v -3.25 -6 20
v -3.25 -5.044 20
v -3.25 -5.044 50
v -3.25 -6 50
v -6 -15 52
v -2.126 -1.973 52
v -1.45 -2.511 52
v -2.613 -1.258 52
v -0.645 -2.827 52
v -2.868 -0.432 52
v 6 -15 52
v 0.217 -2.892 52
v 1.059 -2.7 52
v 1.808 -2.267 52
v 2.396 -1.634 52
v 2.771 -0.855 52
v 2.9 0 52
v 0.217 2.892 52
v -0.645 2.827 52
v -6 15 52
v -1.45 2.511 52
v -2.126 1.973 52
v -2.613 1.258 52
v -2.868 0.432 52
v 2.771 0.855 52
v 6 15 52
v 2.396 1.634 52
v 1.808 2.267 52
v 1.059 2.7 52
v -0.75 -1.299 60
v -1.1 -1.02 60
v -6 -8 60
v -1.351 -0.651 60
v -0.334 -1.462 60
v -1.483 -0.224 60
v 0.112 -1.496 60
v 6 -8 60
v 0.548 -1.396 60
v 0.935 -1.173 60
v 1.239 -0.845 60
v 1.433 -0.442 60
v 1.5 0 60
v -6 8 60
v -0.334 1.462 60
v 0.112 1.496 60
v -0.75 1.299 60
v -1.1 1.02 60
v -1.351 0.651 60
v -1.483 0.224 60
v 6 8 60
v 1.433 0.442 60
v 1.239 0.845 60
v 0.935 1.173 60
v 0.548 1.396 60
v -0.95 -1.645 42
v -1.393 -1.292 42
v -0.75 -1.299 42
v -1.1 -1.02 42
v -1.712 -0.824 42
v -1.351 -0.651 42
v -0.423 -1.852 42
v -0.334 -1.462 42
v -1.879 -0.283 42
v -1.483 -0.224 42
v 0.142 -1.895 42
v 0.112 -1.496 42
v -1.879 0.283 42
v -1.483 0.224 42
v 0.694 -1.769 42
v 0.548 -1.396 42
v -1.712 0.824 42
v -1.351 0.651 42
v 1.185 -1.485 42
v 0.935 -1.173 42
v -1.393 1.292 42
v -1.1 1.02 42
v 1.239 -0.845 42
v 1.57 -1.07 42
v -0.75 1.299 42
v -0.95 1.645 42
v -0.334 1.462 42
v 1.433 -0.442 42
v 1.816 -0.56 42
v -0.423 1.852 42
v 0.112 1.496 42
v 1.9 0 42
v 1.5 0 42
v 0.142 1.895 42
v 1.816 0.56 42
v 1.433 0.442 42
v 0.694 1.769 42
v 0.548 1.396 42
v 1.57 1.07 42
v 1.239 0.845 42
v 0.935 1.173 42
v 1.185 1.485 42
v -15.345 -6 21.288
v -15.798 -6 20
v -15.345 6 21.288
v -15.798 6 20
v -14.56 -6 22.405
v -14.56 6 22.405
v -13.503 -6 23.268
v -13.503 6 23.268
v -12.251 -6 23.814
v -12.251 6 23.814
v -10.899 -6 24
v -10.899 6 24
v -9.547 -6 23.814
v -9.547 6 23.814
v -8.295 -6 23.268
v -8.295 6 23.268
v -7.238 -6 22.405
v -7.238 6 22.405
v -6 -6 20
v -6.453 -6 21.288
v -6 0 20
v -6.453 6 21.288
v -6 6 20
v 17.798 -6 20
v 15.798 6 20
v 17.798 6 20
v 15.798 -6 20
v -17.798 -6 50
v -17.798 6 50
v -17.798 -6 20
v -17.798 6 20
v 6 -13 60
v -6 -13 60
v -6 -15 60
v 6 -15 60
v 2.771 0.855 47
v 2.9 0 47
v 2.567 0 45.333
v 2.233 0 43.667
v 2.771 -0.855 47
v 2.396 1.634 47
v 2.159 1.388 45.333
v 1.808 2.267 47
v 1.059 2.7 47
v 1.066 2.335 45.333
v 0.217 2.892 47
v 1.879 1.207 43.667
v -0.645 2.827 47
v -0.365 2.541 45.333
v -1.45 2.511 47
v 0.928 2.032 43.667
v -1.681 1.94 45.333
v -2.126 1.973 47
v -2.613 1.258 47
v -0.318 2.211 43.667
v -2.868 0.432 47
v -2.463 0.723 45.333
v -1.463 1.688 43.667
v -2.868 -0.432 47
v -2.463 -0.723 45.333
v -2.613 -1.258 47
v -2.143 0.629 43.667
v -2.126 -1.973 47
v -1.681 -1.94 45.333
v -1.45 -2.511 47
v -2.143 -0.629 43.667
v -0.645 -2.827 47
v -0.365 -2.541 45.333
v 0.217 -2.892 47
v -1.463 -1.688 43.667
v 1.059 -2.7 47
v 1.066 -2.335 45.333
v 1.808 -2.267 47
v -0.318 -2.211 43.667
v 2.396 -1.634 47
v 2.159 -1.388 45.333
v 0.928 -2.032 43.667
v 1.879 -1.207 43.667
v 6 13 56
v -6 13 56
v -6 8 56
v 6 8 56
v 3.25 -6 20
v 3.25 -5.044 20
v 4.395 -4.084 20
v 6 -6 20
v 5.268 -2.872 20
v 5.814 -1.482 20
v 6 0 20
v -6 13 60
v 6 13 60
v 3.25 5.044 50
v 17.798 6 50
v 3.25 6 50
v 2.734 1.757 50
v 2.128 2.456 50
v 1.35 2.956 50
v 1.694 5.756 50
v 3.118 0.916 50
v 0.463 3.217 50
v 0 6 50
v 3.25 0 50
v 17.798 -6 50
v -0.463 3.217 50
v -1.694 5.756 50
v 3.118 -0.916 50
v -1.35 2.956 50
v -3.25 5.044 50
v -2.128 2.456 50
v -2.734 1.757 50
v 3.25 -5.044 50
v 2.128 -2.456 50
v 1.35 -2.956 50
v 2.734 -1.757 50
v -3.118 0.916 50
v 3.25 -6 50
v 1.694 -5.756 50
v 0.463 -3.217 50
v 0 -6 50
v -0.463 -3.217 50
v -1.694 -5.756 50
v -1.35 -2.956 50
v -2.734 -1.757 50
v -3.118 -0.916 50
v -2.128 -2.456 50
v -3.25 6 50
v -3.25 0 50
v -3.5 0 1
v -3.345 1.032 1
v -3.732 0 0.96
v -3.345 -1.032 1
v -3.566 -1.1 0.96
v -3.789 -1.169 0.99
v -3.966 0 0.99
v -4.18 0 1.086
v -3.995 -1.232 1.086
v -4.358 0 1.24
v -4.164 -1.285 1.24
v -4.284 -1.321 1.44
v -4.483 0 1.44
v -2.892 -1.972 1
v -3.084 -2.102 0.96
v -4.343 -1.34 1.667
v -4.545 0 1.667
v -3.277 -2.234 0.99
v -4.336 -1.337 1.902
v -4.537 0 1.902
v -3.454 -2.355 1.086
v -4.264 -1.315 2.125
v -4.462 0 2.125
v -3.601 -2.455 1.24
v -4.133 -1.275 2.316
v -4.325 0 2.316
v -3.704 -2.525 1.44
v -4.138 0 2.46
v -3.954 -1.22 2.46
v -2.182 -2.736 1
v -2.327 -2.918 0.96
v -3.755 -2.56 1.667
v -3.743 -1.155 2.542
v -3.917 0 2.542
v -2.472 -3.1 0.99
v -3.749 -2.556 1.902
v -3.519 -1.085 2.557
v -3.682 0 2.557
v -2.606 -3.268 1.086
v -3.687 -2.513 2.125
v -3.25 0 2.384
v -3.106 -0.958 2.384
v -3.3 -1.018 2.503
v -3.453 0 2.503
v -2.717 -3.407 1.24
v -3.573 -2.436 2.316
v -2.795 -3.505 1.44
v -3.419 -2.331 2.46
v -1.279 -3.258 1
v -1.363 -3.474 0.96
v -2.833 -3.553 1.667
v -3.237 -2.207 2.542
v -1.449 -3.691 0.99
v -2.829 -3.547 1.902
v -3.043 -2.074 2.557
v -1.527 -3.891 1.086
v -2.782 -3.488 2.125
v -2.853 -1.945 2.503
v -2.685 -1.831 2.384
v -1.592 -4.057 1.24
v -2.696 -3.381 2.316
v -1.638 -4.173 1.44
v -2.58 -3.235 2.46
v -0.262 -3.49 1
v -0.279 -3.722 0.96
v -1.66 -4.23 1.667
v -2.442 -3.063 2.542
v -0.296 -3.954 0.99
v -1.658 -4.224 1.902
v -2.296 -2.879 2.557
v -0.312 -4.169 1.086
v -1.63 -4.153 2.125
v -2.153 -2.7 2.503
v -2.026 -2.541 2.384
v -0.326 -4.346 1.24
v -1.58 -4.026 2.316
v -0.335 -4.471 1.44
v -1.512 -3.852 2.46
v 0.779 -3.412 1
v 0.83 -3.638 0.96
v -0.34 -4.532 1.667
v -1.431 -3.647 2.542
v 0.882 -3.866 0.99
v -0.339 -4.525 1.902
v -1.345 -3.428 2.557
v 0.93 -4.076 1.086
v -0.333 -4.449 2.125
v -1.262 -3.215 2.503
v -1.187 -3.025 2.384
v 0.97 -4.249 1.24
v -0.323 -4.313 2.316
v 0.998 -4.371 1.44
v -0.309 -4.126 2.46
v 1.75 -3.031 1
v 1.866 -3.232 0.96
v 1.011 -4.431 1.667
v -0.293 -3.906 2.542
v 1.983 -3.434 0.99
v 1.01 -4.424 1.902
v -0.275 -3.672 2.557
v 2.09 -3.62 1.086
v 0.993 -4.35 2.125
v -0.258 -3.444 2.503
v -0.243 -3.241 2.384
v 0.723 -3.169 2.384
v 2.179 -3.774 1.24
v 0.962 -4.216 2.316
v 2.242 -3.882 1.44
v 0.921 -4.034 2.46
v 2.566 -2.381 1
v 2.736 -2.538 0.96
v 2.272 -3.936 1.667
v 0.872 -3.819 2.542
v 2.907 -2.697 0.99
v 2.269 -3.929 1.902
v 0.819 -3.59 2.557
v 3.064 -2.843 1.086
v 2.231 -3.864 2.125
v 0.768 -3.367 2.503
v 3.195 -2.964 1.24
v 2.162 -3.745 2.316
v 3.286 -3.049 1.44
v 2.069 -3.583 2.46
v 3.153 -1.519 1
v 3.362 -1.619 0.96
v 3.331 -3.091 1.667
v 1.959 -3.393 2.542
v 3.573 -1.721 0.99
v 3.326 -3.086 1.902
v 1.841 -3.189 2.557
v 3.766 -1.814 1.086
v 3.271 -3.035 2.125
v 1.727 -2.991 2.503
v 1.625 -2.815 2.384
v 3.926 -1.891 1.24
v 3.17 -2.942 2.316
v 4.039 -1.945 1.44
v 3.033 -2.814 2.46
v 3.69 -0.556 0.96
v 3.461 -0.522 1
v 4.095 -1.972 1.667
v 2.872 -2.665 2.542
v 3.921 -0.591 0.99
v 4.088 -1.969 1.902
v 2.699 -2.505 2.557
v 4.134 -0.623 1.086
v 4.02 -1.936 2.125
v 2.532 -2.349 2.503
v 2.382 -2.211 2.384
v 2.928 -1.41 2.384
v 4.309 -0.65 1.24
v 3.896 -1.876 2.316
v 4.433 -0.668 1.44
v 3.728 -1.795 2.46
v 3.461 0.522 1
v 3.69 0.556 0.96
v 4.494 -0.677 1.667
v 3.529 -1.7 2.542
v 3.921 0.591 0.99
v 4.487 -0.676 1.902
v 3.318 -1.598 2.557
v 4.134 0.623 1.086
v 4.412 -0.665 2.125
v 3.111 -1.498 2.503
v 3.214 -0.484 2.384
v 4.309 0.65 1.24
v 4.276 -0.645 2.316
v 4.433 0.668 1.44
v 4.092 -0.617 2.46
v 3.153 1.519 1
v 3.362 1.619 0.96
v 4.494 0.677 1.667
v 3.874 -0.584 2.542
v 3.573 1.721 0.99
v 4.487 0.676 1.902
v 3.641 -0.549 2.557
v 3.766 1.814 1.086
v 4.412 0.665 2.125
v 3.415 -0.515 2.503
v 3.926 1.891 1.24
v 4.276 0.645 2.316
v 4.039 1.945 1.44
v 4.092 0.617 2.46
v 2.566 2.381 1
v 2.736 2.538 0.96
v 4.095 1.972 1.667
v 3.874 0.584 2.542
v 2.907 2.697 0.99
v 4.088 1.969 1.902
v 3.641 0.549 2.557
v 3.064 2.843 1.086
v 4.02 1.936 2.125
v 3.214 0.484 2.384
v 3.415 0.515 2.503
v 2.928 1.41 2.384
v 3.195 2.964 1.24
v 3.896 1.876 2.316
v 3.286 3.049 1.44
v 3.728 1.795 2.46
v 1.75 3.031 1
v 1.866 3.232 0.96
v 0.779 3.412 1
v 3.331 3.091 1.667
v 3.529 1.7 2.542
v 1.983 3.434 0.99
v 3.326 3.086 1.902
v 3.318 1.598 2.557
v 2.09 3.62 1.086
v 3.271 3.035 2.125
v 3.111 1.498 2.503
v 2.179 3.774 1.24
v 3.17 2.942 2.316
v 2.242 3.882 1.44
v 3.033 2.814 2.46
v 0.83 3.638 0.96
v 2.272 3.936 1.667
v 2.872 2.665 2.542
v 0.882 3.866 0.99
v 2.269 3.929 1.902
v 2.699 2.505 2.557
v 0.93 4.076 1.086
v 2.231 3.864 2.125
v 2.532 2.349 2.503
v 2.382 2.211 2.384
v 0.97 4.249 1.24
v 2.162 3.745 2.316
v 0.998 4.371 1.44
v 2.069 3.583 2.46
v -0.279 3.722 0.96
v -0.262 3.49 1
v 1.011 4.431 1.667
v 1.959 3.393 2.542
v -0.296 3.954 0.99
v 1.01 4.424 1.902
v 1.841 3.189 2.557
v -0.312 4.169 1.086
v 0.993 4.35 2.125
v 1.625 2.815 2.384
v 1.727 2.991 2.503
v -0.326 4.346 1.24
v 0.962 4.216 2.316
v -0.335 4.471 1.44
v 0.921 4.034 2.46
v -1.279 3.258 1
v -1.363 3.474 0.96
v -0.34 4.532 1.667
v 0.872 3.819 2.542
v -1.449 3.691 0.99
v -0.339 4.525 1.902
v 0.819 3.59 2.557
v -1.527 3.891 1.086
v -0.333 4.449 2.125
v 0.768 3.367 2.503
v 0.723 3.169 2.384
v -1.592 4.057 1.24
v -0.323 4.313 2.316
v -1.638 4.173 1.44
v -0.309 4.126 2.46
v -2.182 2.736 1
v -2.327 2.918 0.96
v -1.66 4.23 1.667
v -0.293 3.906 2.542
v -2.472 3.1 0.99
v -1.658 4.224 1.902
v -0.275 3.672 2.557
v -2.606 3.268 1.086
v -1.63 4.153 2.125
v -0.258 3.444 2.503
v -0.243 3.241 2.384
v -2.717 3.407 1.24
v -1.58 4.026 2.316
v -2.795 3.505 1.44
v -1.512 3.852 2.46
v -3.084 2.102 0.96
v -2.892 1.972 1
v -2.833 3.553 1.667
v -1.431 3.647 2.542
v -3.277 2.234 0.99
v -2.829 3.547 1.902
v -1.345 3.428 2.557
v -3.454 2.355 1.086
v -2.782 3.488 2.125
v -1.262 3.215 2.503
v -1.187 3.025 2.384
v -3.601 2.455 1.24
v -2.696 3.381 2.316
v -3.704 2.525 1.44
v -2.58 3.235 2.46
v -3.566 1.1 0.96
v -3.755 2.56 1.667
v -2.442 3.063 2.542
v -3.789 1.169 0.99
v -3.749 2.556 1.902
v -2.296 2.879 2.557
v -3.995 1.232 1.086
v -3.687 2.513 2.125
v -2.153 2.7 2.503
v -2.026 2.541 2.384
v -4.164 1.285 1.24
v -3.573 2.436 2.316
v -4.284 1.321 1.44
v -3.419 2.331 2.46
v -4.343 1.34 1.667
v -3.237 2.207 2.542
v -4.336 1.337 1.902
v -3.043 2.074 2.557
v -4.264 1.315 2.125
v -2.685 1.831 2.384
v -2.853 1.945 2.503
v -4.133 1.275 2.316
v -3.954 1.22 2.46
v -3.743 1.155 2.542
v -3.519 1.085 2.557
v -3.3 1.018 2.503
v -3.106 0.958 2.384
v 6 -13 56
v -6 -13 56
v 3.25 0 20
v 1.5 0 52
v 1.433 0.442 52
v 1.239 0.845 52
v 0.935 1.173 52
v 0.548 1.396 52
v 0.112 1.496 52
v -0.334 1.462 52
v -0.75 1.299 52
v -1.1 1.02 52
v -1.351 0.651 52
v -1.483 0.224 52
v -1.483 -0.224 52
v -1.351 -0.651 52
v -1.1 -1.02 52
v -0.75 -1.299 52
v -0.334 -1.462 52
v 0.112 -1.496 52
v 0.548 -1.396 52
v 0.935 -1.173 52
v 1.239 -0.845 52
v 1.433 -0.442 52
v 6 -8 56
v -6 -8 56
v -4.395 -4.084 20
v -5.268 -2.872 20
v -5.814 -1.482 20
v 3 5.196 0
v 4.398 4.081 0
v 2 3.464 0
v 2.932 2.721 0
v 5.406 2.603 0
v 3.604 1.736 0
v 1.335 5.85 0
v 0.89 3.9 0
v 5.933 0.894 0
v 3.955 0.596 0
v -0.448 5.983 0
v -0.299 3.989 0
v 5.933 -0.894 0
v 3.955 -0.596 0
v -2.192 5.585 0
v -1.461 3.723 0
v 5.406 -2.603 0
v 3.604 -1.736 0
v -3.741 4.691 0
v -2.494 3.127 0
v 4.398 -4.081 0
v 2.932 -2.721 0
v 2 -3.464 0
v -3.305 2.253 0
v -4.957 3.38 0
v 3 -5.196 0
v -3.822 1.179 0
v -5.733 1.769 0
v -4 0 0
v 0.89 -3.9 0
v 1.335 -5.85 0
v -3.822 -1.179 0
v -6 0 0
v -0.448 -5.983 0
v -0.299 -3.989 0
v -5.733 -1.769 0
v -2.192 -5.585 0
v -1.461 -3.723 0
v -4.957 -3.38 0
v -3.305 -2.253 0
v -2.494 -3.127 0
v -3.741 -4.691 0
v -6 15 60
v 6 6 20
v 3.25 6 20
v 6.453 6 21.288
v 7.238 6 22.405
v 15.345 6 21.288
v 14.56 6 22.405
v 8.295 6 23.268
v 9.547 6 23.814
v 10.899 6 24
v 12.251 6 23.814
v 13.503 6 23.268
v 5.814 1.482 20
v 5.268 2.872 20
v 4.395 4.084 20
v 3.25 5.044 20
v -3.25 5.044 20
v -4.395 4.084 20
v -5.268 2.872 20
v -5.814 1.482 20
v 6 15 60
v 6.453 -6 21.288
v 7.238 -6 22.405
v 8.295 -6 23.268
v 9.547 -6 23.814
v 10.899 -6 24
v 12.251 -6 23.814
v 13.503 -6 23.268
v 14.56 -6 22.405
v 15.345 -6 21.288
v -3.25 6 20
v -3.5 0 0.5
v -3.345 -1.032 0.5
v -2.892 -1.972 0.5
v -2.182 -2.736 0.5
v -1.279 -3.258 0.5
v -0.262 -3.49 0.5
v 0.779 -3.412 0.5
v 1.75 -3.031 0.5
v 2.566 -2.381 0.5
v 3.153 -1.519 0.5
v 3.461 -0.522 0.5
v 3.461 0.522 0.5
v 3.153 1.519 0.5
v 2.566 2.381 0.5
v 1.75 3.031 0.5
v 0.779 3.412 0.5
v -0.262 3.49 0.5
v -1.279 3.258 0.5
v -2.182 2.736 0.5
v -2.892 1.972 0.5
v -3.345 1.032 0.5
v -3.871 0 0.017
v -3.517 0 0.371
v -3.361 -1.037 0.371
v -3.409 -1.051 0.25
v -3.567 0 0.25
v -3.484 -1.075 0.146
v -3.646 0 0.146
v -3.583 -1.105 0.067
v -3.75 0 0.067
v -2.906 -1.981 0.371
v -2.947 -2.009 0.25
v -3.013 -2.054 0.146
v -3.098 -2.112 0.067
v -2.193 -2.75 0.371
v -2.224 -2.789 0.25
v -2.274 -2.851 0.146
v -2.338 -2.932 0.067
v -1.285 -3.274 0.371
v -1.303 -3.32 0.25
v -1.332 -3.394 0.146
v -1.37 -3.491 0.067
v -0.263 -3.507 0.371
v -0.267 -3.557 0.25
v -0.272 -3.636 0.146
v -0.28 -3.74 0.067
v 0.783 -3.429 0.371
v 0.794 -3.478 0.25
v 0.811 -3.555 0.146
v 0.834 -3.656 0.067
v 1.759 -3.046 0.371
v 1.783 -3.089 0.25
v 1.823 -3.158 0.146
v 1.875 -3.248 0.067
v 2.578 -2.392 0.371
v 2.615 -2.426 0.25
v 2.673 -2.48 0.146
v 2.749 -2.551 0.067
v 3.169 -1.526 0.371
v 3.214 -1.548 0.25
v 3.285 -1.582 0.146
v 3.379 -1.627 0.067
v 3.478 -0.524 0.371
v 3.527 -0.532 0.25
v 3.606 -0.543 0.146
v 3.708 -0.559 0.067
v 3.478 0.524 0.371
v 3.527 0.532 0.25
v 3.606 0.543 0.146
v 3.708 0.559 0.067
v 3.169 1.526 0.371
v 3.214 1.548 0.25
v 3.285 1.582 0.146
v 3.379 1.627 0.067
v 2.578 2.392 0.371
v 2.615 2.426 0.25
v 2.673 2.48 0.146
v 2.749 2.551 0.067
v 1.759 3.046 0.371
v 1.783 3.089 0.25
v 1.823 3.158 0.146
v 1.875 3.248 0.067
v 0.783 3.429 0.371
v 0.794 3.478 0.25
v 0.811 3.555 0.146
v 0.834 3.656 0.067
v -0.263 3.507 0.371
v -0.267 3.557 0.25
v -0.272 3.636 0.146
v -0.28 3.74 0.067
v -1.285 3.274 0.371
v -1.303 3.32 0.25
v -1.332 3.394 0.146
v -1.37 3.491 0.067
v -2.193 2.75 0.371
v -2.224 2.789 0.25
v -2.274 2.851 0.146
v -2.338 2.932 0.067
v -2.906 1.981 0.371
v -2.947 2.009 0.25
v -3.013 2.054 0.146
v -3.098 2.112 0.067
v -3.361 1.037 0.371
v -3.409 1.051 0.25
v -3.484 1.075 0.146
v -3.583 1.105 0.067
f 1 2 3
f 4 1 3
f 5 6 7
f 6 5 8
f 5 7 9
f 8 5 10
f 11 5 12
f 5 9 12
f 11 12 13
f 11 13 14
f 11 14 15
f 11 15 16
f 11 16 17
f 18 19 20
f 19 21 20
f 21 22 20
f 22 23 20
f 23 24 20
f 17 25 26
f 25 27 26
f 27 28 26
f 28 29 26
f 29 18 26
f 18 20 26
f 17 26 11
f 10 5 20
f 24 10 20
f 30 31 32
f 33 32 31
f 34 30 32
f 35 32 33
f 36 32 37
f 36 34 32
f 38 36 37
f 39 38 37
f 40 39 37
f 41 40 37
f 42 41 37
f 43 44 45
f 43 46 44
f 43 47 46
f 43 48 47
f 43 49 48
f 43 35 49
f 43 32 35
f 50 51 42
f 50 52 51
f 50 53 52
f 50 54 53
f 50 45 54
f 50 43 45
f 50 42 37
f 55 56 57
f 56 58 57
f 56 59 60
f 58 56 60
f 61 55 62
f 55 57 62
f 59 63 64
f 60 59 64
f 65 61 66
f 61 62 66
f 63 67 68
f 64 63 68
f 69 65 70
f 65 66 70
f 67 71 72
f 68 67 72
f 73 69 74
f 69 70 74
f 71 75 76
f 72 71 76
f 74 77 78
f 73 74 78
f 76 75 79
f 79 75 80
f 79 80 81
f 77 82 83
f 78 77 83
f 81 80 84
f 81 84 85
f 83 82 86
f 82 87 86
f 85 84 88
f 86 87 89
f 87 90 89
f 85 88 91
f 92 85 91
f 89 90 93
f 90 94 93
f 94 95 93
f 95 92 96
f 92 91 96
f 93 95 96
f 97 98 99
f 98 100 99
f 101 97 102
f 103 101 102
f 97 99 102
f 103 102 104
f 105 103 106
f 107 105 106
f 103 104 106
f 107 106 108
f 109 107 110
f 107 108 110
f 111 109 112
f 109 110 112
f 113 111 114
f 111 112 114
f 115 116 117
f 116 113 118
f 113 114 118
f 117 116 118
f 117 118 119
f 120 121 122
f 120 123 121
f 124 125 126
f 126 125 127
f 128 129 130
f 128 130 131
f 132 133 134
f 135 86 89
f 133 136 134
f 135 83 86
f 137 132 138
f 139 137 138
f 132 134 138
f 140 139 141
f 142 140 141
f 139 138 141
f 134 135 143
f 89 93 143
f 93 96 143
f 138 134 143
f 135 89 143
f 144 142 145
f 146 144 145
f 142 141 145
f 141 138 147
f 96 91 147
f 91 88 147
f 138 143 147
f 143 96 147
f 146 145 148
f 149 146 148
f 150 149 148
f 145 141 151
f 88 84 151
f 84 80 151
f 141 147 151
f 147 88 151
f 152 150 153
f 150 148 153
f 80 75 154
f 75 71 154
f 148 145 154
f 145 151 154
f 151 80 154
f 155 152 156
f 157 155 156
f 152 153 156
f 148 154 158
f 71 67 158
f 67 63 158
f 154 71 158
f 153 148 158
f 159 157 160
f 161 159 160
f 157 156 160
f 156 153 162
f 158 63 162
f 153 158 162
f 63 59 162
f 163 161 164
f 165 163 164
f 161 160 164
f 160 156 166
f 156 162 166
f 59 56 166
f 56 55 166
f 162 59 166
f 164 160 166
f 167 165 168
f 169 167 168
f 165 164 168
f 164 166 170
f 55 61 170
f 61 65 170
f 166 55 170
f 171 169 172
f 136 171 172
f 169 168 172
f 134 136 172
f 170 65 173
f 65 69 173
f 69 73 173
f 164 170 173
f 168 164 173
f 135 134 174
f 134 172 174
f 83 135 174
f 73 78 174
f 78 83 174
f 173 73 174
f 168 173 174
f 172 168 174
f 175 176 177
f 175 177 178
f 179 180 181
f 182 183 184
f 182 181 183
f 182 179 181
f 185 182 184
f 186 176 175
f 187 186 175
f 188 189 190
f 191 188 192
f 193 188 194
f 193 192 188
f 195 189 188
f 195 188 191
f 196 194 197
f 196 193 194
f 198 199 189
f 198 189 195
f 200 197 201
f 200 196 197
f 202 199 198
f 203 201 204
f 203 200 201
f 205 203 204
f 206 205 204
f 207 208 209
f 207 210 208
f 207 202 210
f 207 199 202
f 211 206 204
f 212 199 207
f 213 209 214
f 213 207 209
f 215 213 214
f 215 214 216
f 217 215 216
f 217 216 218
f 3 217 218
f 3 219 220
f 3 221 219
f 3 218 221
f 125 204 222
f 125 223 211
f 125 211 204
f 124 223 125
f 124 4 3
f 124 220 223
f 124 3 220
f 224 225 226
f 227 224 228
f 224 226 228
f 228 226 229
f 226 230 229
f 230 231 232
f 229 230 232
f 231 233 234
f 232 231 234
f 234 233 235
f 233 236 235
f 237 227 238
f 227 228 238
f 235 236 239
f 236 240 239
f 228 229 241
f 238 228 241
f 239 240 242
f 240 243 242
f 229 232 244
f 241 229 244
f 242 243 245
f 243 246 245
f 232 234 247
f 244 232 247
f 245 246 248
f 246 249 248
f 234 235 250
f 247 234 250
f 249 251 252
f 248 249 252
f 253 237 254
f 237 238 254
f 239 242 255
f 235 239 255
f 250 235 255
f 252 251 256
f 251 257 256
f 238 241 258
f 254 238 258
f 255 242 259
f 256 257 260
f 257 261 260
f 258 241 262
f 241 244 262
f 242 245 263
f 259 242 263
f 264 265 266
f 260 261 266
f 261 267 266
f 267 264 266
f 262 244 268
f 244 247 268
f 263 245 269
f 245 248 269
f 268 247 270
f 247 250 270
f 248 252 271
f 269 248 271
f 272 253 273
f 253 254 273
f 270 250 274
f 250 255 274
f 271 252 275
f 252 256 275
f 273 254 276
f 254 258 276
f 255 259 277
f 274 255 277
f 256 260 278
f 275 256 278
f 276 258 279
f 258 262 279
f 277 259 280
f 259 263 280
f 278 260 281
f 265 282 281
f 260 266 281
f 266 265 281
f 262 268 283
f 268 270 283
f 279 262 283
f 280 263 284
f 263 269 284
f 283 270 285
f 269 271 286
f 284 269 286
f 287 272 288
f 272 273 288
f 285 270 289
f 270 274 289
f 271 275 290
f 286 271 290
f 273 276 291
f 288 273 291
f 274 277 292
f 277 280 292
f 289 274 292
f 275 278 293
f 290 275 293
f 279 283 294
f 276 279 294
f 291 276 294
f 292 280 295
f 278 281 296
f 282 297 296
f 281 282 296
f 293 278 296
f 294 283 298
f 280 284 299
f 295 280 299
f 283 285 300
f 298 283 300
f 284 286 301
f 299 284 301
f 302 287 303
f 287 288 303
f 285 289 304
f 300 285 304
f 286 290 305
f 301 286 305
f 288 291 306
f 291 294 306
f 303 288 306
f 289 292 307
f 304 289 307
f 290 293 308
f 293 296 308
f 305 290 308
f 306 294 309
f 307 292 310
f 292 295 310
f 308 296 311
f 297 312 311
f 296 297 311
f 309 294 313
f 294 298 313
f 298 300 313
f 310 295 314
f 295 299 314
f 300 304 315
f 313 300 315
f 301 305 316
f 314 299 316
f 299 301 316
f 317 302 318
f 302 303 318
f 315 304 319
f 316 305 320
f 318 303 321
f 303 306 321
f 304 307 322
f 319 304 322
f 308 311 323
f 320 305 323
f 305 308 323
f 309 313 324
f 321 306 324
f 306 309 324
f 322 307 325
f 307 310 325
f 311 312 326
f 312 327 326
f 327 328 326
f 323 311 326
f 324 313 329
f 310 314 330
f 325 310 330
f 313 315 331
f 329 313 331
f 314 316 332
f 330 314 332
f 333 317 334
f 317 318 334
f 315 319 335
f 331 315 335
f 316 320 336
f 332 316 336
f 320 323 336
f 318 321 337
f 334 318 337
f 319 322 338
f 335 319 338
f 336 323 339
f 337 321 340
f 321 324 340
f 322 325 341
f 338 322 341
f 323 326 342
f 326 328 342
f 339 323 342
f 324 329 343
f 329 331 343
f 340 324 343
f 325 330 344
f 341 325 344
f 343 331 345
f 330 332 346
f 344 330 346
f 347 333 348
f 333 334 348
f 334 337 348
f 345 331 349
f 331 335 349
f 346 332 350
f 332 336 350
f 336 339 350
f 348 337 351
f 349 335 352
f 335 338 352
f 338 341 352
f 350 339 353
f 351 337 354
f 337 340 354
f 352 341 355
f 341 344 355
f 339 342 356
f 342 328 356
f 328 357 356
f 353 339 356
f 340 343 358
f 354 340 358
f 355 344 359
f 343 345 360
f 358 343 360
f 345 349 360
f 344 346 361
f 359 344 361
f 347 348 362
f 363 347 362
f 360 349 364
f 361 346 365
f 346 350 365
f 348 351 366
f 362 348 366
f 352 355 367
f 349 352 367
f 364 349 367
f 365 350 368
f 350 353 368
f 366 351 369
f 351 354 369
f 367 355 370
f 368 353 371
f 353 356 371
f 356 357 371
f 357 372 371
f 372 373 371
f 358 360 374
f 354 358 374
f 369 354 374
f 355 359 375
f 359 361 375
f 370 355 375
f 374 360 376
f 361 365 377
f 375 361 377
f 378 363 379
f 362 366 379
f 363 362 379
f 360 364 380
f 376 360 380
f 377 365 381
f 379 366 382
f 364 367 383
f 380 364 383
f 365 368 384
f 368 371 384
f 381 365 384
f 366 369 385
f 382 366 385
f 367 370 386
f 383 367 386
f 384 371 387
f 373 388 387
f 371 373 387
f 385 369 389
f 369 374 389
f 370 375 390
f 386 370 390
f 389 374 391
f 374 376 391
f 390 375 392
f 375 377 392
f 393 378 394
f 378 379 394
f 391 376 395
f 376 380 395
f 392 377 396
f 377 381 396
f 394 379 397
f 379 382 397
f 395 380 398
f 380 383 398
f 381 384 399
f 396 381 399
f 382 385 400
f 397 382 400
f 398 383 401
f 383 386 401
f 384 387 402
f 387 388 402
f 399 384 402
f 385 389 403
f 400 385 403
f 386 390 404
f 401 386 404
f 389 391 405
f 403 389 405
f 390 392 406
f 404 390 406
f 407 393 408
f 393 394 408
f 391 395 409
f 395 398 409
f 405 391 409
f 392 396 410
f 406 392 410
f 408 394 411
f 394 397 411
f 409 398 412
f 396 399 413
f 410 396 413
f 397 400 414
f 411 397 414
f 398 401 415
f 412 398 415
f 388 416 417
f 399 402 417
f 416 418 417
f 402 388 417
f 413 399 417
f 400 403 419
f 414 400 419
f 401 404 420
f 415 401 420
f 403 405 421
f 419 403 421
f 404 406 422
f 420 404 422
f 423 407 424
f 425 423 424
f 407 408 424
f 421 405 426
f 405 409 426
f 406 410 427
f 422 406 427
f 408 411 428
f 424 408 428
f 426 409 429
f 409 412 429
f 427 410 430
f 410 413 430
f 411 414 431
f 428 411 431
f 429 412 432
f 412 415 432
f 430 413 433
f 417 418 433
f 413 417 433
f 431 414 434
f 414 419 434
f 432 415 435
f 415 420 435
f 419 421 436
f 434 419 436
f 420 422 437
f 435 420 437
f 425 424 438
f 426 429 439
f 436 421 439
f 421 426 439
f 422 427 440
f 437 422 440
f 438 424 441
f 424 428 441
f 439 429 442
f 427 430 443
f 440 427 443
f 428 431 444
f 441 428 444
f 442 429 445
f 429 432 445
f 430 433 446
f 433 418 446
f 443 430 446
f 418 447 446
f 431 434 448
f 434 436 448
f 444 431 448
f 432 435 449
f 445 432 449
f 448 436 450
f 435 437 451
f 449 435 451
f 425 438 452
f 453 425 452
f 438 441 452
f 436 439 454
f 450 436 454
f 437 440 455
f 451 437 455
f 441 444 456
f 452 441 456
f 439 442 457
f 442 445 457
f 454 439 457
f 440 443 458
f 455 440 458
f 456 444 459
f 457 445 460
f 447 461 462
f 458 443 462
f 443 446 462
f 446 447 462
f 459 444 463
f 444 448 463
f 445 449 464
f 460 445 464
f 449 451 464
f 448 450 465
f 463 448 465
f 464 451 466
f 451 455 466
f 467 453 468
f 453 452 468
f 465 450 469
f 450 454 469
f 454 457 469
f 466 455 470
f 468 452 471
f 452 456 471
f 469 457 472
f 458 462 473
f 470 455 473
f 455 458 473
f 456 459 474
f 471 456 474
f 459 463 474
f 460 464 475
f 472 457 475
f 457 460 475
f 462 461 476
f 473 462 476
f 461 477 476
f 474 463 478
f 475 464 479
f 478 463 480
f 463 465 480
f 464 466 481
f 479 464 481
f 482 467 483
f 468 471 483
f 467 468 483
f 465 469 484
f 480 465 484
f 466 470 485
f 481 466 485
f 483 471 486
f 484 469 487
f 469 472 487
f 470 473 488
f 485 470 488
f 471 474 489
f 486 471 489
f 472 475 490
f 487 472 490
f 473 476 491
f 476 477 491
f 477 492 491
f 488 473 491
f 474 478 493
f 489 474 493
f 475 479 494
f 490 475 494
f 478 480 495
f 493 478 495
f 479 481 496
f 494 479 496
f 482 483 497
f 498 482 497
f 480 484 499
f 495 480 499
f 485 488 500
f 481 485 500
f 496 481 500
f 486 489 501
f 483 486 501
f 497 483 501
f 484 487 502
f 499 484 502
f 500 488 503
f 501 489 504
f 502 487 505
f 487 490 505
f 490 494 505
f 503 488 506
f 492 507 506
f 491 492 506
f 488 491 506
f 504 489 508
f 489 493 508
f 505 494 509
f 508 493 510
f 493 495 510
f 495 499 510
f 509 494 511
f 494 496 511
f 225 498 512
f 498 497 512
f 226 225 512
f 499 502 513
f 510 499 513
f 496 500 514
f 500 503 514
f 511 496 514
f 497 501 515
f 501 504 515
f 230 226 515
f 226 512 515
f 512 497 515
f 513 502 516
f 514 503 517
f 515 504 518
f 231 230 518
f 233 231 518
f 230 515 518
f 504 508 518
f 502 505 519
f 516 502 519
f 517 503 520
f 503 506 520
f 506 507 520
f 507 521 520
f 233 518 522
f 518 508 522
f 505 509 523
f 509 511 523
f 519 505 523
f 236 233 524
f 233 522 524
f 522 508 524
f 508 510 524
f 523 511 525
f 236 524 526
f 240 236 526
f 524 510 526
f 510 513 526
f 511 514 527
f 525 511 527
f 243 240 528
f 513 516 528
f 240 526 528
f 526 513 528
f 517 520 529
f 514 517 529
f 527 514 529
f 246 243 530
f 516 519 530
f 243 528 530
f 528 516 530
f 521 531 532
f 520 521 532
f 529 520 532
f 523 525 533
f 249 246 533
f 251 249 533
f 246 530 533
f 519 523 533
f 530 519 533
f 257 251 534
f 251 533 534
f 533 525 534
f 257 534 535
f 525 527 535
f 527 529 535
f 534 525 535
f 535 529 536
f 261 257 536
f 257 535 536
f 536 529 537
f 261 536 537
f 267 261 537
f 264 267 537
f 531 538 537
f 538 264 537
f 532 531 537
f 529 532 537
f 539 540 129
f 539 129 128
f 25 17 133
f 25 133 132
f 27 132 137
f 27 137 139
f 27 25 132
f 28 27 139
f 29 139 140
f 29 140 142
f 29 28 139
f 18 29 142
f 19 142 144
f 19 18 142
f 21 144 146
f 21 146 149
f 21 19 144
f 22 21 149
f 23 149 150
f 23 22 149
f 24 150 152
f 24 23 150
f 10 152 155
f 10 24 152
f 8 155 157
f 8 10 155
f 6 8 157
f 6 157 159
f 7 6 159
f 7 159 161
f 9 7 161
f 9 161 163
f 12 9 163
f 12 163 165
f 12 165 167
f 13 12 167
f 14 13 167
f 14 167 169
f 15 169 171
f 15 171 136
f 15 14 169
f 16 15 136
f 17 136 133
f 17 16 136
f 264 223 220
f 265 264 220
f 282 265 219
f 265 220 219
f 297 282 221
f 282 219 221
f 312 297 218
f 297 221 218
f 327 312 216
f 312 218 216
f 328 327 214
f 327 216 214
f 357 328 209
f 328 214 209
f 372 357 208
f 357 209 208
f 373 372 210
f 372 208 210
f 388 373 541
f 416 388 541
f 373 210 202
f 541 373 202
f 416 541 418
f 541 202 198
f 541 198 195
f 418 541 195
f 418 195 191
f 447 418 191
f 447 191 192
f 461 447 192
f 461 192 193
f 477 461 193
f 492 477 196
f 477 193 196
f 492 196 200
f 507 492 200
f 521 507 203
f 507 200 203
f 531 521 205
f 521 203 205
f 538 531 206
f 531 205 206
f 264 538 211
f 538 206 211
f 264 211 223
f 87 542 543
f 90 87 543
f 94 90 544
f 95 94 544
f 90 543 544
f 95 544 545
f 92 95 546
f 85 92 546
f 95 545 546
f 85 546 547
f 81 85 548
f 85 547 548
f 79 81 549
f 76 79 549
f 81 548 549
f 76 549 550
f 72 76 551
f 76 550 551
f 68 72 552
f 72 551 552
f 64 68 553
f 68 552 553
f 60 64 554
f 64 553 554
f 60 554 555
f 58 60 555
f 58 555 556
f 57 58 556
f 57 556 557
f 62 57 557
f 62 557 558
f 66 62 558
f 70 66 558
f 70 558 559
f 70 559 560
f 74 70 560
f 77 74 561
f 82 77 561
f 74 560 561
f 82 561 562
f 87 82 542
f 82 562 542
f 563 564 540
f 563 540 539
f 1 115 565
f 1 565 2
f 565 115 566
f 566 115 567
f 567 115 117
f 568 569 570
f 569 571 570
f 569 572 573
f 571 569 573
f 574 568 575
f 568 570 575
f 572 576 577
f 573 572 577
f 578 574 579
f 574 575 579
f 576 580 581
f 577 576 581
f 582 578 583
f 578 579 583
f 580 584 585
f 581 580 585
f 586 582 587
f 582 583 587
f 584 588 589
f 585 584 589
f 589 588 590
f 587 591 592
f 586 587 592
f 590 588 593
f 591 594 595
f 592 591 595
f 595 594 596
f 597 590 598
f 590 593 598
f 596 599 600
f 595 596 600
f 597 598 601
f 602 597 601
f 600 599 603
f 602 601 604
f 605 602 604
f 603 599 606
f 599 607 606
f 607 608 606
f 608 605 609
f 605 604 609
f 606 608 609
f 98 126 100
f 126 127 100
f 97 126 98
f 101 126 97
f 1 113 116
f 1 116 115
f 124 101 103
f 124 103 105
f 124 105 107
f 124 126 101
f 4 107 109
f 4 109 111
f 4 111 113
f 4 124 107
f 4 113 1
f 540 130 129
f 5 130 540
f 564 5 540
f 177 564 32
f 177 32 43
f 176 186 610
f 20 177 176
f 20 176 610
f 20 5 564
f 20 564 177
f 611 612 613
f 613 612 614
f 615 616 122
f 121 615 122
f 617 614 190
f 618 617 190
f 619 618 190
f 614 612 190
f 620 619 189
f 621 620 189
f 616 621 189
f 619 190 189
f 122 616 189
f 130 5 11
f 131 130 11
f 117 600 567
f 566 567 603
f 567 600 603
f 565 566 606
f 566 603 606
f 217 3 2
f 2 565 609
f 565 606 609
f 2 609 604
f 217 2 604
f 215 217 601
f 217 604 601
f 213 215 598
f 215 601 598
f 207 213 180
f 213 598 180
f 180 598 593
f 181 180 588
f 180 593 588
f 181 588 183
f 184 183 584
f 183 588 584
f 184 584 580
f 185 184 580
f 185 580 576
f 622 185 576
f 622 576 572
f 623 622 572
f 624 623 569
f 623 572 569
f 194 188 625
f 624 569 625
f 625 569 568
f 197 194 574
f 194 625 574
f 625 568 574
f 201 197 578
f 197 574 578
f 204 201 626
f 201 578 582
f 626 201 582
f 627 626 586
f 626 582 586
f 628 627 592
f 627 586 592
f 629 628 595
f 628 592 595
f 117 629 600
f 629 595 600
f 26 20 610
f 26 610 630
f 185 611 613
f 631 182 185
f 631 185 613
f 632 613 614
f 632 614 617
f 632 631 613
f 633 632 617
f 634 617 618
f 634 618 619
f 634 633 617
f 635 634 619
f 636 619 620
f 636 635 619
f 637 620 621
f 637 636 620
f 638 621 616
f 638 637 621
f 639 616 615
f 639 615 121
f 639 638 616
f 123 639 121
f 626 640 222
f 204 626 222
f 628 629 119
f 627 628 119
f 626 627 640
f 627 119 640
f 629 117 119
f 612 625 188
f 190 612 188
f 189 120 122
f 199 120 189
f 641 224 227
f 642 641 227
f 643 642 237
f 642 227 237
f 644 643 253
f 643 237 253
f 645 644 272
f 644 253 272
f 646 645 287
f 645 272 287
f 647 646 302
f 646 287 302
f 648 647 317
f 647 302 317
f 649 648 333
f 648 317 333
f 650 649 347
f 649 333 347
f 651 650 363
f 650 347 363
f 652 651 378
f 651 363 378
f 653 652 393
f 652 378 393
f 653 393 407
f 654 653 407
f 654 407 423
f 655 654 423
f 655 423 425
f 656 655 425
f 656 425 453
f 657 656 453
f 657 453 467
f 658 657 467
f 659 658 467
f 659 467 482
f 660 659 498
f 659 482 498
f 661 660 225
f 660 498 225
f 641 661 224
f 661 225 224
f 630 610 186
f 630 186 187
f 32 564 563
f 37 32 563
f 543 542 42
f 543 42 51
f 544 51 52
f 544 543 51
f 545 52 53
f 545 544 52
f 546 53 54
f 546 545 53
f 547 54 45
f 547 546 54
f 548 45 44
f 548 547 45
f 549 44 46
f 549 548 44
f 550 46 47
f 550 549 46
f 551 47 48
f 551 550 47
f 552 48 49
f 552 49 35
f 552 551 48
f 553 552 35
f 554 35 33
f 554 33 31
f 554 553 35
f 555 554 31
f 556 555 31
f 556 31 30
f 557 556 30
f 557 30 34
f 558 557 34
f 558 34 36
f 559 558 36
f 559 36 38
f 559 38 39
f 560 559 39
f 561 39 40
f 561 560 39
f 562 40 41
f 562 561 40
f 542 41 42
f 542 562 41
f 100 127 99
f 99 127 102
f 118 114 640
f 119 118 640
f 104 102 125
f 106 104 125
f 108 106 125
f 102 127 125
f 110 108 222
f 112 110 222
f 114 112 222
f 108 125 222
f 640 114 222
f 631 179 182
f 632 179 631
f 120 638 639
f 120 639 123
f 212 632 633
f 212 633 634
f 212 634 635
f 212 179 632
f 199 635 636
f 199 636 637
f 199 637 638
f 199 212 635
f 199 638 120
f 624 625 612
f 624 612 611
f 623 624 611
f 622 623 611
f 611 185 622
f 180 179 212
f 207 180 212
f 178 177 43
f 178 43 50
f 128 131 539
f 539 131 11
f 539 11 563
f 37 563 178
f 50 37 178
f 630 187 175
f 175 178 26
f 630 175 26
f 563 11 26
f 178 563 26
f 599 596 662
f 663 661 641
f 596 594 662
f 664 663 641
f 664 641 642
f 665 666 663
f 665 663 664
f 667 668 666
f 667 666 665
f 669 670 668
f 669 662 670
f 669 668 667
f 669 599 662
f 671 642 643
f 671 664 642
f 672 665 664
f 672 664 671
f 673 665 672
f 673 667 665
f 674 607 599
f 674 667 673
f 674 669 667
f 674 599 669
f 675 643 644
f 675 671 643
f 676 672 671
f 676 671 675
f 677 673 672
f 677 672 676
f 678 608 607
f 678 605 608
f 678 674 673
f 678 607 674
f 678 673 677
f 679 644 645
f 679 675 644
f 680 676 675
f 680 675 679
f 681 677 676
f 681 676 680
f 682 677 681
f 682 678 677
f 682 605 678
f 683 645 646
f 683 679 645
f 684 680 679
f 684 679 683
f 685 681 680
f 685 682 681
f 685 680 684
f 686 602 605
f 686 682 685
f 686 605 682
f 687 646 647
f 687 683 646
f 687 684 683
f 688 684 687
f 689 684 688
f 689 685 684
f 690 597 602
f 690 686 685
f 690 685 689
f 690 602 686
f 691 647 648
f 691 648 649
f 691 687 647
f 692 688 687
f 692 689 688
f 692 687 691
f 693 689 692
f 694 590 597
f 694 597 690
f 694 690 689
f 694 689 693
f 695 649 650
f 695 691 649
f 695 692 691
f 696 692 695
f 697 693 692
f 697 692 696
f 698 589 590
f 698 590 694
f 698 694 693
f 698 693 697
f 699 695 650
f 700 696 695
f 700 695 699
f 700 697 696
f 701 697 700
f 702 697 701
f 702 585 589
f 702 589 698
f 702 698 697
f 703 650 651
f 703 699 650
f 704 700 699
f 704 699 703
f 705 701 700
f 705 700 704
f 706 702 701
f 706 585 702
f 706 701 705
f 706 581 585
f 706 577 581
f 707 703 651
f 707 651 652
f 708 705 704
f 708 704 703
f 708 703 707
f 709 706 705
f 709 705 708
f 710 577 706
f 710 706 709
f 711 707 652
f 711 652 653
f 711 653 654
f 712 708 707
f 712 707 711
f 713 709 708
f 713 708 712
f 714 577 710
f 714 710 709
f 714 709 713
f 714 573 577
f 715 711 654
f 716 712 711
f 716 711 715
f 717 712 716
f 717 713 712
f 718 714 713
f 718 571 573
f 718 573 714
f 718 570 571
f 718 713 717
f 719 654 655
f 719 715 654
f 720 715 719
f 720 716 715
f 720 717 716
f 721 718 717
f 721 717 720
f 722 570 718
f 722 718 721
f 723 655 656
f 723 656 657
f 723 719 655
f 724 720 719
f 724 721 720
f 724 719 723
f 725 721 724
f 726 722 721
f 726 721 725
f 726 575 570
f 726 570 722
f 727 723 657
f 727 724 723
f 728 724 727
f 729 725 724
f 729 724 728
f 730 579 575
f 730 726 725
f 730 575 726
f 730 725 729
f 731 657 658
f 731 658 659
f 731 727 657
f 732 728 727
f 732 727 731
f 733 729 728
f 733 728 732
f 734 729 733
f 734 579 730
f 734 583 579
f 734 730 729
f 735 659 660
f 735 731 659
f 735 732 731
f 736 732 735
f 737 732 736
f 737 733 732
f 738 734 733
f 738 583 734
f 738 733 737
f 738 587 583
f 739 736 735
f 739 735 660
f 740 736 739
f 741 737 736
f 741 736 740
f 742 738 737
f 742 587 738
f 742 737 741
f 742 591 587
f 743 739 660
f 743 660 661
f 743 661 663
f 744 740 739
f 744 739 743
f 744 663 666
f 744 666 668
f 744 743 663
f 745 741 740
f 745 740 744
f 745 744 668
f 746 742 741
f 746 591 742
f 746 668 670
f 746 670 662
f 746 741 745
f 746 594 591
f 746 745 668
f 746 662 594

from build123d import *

# Parameters (mm, degrees)
F2_W     = 2.75
F2_H     = 30
F3_DEPTH = 6
F5_W     = 12
F5_H     = 16
F5_R     = 2.9
F5_R_2   = 1.5
F6_DEPTH = 8
F5_H_2   = 2
F5_H_3   = 5
F7_DEPTH = 4
F8_DEPTH = 10
F9_SIZE2 = 1
F9_SIZE  = 5
F10_R    = 0.5


with BuildPart() as f1:
    # F0 (on Front) → F1 (revolve)
    with BuildSketch(Plane.XZ):
        with BuildLine():
            Line((-6, 0), (-3.5, 0))
            Line((-3.5, 0), (-3.5, 1))
            ThreePointArc((-3.5, 1), (-4.5372670324, 1.9020982668), (-3.25, 2.3844340075))
            Line((-3.25, 2.3844340075), (-3.25, 50))
            Line((-3.25, 50), (-6, 50))
            Line((-6, 50), (-6, 0))
        make_face()
    revolve(axis=Axis((0, 0, 28.656648472), (0, 0, 1)))

    # F2 (on Front) → F3 (join, symmetric)
    with BuildSketch(Plane.XZ):
        with BuildLine():
            Line((-6, 20), (-6, 50))
            Line((-6, 50), (-17.7979589711, 50))
            Line((-17.7979589711, 50), (-17.7979589711, 20))
            Line((-17.7979589711, 20), (-15.7979589711, 20))
            ThreePointArc((-15.7979589711, 20), (-10.8989794856, 24), (-6, 20))
        make_face()
        with BuildLine():
            Line((17.7979589711, 50), (6, 50))
            Line((6, 50), (6, 20))
            ThreePointArc((6, 20), (10.8989794856, 24), (15.7979589711, 20))
            Line((15.7979589711, 20), (17.7979589711, 20))
            Line((17.7979589711, 20), (17.7979589711, 50))
        make_face()
        with Locations((4.625, 35)):
            Rectangle(F2_W, F2_H)
        with Locations((-4.625, 35)):
            Rectangle(F2_W, F2_H)
    extrude(amount=F3_DEPTH, both=True)

    # F10
    f10_edges = [f1.edges().sort_by_distance(p)[0] for p in [
        (3.5, 0, 0),
    ]]
    fillet(f10_edges, radius=F10_R)


with BuildPart() as f6:
    # F5 (on offset) → F6 (new body)
    with BuildSketch(Plane.XY.offset(52)):
        Rectangle(F5_W, F5_H)
        Circle(F5_R, mode=Mode.SUBTRACT)
        Circle(F5_R)
        Circle(F5_R_2, mode=Mode.SUBTRACT)
    extrude(amount=F6_DEPTH)



with BuildPart() as f6b:
    # F5 (on offset) → F6, piece 2 (new body)
    with BuildSketch(Plane.XY.offset(52)):
        with Locations((0, -14)):
            Rectangle(F5_W, F5_H_2)
    extrude(amount=F6_DEPTH)


with BuildPart() as f6c:
    # F5 (on offset) → F6, piece 3 (new body)
    with BuildSketch(Plane.XY.offset(52)):
        with Locations((0, 14)):
            Rectangle(F5_W, F5_H_2)
    extrude(amount=F6_DEPTH)


with BuildPart() as f6_1:
    add(f6.part)

    add(f6b.part)  # F7 merges F6b

    add(f6c.part)  # F7 merges F6c
    # F5 (on offset) → F7 (join)
    with BuildSketch(Plane.XY.offset(52)):
        with Locations((0, 10.5)):
            Rectangle(F5_W, F5_H_3)
        with Locations((0, -10.5)):
            Rectangle(F5_W, F5_H_3)
    extrude(amount=F7_DEPTH)

    # F5 (on offset) → F8 (join)
    with BuildSketch(Plane.XY.offset(52)):
        Circle(F5_R)
        Circle(F5_R_2, mode=Mode.SUBTRACT)
    extrude(amount=-F8_DEPTH)

    # F9
    f9_edges = [f6_1.edges().sort_by_distance(p)[0] for p in [
        (-2.9, 0, 42),
    ]]
    f9_side = f6_1.faces().sort_by_distance((-2.9, 0, 47))[0]
    chamfer(f9_edges, length=F9_SIZE, length2=F9_SIZE2, reference=f9_side)


solid = Compound([f1.part, f6_1.part])
